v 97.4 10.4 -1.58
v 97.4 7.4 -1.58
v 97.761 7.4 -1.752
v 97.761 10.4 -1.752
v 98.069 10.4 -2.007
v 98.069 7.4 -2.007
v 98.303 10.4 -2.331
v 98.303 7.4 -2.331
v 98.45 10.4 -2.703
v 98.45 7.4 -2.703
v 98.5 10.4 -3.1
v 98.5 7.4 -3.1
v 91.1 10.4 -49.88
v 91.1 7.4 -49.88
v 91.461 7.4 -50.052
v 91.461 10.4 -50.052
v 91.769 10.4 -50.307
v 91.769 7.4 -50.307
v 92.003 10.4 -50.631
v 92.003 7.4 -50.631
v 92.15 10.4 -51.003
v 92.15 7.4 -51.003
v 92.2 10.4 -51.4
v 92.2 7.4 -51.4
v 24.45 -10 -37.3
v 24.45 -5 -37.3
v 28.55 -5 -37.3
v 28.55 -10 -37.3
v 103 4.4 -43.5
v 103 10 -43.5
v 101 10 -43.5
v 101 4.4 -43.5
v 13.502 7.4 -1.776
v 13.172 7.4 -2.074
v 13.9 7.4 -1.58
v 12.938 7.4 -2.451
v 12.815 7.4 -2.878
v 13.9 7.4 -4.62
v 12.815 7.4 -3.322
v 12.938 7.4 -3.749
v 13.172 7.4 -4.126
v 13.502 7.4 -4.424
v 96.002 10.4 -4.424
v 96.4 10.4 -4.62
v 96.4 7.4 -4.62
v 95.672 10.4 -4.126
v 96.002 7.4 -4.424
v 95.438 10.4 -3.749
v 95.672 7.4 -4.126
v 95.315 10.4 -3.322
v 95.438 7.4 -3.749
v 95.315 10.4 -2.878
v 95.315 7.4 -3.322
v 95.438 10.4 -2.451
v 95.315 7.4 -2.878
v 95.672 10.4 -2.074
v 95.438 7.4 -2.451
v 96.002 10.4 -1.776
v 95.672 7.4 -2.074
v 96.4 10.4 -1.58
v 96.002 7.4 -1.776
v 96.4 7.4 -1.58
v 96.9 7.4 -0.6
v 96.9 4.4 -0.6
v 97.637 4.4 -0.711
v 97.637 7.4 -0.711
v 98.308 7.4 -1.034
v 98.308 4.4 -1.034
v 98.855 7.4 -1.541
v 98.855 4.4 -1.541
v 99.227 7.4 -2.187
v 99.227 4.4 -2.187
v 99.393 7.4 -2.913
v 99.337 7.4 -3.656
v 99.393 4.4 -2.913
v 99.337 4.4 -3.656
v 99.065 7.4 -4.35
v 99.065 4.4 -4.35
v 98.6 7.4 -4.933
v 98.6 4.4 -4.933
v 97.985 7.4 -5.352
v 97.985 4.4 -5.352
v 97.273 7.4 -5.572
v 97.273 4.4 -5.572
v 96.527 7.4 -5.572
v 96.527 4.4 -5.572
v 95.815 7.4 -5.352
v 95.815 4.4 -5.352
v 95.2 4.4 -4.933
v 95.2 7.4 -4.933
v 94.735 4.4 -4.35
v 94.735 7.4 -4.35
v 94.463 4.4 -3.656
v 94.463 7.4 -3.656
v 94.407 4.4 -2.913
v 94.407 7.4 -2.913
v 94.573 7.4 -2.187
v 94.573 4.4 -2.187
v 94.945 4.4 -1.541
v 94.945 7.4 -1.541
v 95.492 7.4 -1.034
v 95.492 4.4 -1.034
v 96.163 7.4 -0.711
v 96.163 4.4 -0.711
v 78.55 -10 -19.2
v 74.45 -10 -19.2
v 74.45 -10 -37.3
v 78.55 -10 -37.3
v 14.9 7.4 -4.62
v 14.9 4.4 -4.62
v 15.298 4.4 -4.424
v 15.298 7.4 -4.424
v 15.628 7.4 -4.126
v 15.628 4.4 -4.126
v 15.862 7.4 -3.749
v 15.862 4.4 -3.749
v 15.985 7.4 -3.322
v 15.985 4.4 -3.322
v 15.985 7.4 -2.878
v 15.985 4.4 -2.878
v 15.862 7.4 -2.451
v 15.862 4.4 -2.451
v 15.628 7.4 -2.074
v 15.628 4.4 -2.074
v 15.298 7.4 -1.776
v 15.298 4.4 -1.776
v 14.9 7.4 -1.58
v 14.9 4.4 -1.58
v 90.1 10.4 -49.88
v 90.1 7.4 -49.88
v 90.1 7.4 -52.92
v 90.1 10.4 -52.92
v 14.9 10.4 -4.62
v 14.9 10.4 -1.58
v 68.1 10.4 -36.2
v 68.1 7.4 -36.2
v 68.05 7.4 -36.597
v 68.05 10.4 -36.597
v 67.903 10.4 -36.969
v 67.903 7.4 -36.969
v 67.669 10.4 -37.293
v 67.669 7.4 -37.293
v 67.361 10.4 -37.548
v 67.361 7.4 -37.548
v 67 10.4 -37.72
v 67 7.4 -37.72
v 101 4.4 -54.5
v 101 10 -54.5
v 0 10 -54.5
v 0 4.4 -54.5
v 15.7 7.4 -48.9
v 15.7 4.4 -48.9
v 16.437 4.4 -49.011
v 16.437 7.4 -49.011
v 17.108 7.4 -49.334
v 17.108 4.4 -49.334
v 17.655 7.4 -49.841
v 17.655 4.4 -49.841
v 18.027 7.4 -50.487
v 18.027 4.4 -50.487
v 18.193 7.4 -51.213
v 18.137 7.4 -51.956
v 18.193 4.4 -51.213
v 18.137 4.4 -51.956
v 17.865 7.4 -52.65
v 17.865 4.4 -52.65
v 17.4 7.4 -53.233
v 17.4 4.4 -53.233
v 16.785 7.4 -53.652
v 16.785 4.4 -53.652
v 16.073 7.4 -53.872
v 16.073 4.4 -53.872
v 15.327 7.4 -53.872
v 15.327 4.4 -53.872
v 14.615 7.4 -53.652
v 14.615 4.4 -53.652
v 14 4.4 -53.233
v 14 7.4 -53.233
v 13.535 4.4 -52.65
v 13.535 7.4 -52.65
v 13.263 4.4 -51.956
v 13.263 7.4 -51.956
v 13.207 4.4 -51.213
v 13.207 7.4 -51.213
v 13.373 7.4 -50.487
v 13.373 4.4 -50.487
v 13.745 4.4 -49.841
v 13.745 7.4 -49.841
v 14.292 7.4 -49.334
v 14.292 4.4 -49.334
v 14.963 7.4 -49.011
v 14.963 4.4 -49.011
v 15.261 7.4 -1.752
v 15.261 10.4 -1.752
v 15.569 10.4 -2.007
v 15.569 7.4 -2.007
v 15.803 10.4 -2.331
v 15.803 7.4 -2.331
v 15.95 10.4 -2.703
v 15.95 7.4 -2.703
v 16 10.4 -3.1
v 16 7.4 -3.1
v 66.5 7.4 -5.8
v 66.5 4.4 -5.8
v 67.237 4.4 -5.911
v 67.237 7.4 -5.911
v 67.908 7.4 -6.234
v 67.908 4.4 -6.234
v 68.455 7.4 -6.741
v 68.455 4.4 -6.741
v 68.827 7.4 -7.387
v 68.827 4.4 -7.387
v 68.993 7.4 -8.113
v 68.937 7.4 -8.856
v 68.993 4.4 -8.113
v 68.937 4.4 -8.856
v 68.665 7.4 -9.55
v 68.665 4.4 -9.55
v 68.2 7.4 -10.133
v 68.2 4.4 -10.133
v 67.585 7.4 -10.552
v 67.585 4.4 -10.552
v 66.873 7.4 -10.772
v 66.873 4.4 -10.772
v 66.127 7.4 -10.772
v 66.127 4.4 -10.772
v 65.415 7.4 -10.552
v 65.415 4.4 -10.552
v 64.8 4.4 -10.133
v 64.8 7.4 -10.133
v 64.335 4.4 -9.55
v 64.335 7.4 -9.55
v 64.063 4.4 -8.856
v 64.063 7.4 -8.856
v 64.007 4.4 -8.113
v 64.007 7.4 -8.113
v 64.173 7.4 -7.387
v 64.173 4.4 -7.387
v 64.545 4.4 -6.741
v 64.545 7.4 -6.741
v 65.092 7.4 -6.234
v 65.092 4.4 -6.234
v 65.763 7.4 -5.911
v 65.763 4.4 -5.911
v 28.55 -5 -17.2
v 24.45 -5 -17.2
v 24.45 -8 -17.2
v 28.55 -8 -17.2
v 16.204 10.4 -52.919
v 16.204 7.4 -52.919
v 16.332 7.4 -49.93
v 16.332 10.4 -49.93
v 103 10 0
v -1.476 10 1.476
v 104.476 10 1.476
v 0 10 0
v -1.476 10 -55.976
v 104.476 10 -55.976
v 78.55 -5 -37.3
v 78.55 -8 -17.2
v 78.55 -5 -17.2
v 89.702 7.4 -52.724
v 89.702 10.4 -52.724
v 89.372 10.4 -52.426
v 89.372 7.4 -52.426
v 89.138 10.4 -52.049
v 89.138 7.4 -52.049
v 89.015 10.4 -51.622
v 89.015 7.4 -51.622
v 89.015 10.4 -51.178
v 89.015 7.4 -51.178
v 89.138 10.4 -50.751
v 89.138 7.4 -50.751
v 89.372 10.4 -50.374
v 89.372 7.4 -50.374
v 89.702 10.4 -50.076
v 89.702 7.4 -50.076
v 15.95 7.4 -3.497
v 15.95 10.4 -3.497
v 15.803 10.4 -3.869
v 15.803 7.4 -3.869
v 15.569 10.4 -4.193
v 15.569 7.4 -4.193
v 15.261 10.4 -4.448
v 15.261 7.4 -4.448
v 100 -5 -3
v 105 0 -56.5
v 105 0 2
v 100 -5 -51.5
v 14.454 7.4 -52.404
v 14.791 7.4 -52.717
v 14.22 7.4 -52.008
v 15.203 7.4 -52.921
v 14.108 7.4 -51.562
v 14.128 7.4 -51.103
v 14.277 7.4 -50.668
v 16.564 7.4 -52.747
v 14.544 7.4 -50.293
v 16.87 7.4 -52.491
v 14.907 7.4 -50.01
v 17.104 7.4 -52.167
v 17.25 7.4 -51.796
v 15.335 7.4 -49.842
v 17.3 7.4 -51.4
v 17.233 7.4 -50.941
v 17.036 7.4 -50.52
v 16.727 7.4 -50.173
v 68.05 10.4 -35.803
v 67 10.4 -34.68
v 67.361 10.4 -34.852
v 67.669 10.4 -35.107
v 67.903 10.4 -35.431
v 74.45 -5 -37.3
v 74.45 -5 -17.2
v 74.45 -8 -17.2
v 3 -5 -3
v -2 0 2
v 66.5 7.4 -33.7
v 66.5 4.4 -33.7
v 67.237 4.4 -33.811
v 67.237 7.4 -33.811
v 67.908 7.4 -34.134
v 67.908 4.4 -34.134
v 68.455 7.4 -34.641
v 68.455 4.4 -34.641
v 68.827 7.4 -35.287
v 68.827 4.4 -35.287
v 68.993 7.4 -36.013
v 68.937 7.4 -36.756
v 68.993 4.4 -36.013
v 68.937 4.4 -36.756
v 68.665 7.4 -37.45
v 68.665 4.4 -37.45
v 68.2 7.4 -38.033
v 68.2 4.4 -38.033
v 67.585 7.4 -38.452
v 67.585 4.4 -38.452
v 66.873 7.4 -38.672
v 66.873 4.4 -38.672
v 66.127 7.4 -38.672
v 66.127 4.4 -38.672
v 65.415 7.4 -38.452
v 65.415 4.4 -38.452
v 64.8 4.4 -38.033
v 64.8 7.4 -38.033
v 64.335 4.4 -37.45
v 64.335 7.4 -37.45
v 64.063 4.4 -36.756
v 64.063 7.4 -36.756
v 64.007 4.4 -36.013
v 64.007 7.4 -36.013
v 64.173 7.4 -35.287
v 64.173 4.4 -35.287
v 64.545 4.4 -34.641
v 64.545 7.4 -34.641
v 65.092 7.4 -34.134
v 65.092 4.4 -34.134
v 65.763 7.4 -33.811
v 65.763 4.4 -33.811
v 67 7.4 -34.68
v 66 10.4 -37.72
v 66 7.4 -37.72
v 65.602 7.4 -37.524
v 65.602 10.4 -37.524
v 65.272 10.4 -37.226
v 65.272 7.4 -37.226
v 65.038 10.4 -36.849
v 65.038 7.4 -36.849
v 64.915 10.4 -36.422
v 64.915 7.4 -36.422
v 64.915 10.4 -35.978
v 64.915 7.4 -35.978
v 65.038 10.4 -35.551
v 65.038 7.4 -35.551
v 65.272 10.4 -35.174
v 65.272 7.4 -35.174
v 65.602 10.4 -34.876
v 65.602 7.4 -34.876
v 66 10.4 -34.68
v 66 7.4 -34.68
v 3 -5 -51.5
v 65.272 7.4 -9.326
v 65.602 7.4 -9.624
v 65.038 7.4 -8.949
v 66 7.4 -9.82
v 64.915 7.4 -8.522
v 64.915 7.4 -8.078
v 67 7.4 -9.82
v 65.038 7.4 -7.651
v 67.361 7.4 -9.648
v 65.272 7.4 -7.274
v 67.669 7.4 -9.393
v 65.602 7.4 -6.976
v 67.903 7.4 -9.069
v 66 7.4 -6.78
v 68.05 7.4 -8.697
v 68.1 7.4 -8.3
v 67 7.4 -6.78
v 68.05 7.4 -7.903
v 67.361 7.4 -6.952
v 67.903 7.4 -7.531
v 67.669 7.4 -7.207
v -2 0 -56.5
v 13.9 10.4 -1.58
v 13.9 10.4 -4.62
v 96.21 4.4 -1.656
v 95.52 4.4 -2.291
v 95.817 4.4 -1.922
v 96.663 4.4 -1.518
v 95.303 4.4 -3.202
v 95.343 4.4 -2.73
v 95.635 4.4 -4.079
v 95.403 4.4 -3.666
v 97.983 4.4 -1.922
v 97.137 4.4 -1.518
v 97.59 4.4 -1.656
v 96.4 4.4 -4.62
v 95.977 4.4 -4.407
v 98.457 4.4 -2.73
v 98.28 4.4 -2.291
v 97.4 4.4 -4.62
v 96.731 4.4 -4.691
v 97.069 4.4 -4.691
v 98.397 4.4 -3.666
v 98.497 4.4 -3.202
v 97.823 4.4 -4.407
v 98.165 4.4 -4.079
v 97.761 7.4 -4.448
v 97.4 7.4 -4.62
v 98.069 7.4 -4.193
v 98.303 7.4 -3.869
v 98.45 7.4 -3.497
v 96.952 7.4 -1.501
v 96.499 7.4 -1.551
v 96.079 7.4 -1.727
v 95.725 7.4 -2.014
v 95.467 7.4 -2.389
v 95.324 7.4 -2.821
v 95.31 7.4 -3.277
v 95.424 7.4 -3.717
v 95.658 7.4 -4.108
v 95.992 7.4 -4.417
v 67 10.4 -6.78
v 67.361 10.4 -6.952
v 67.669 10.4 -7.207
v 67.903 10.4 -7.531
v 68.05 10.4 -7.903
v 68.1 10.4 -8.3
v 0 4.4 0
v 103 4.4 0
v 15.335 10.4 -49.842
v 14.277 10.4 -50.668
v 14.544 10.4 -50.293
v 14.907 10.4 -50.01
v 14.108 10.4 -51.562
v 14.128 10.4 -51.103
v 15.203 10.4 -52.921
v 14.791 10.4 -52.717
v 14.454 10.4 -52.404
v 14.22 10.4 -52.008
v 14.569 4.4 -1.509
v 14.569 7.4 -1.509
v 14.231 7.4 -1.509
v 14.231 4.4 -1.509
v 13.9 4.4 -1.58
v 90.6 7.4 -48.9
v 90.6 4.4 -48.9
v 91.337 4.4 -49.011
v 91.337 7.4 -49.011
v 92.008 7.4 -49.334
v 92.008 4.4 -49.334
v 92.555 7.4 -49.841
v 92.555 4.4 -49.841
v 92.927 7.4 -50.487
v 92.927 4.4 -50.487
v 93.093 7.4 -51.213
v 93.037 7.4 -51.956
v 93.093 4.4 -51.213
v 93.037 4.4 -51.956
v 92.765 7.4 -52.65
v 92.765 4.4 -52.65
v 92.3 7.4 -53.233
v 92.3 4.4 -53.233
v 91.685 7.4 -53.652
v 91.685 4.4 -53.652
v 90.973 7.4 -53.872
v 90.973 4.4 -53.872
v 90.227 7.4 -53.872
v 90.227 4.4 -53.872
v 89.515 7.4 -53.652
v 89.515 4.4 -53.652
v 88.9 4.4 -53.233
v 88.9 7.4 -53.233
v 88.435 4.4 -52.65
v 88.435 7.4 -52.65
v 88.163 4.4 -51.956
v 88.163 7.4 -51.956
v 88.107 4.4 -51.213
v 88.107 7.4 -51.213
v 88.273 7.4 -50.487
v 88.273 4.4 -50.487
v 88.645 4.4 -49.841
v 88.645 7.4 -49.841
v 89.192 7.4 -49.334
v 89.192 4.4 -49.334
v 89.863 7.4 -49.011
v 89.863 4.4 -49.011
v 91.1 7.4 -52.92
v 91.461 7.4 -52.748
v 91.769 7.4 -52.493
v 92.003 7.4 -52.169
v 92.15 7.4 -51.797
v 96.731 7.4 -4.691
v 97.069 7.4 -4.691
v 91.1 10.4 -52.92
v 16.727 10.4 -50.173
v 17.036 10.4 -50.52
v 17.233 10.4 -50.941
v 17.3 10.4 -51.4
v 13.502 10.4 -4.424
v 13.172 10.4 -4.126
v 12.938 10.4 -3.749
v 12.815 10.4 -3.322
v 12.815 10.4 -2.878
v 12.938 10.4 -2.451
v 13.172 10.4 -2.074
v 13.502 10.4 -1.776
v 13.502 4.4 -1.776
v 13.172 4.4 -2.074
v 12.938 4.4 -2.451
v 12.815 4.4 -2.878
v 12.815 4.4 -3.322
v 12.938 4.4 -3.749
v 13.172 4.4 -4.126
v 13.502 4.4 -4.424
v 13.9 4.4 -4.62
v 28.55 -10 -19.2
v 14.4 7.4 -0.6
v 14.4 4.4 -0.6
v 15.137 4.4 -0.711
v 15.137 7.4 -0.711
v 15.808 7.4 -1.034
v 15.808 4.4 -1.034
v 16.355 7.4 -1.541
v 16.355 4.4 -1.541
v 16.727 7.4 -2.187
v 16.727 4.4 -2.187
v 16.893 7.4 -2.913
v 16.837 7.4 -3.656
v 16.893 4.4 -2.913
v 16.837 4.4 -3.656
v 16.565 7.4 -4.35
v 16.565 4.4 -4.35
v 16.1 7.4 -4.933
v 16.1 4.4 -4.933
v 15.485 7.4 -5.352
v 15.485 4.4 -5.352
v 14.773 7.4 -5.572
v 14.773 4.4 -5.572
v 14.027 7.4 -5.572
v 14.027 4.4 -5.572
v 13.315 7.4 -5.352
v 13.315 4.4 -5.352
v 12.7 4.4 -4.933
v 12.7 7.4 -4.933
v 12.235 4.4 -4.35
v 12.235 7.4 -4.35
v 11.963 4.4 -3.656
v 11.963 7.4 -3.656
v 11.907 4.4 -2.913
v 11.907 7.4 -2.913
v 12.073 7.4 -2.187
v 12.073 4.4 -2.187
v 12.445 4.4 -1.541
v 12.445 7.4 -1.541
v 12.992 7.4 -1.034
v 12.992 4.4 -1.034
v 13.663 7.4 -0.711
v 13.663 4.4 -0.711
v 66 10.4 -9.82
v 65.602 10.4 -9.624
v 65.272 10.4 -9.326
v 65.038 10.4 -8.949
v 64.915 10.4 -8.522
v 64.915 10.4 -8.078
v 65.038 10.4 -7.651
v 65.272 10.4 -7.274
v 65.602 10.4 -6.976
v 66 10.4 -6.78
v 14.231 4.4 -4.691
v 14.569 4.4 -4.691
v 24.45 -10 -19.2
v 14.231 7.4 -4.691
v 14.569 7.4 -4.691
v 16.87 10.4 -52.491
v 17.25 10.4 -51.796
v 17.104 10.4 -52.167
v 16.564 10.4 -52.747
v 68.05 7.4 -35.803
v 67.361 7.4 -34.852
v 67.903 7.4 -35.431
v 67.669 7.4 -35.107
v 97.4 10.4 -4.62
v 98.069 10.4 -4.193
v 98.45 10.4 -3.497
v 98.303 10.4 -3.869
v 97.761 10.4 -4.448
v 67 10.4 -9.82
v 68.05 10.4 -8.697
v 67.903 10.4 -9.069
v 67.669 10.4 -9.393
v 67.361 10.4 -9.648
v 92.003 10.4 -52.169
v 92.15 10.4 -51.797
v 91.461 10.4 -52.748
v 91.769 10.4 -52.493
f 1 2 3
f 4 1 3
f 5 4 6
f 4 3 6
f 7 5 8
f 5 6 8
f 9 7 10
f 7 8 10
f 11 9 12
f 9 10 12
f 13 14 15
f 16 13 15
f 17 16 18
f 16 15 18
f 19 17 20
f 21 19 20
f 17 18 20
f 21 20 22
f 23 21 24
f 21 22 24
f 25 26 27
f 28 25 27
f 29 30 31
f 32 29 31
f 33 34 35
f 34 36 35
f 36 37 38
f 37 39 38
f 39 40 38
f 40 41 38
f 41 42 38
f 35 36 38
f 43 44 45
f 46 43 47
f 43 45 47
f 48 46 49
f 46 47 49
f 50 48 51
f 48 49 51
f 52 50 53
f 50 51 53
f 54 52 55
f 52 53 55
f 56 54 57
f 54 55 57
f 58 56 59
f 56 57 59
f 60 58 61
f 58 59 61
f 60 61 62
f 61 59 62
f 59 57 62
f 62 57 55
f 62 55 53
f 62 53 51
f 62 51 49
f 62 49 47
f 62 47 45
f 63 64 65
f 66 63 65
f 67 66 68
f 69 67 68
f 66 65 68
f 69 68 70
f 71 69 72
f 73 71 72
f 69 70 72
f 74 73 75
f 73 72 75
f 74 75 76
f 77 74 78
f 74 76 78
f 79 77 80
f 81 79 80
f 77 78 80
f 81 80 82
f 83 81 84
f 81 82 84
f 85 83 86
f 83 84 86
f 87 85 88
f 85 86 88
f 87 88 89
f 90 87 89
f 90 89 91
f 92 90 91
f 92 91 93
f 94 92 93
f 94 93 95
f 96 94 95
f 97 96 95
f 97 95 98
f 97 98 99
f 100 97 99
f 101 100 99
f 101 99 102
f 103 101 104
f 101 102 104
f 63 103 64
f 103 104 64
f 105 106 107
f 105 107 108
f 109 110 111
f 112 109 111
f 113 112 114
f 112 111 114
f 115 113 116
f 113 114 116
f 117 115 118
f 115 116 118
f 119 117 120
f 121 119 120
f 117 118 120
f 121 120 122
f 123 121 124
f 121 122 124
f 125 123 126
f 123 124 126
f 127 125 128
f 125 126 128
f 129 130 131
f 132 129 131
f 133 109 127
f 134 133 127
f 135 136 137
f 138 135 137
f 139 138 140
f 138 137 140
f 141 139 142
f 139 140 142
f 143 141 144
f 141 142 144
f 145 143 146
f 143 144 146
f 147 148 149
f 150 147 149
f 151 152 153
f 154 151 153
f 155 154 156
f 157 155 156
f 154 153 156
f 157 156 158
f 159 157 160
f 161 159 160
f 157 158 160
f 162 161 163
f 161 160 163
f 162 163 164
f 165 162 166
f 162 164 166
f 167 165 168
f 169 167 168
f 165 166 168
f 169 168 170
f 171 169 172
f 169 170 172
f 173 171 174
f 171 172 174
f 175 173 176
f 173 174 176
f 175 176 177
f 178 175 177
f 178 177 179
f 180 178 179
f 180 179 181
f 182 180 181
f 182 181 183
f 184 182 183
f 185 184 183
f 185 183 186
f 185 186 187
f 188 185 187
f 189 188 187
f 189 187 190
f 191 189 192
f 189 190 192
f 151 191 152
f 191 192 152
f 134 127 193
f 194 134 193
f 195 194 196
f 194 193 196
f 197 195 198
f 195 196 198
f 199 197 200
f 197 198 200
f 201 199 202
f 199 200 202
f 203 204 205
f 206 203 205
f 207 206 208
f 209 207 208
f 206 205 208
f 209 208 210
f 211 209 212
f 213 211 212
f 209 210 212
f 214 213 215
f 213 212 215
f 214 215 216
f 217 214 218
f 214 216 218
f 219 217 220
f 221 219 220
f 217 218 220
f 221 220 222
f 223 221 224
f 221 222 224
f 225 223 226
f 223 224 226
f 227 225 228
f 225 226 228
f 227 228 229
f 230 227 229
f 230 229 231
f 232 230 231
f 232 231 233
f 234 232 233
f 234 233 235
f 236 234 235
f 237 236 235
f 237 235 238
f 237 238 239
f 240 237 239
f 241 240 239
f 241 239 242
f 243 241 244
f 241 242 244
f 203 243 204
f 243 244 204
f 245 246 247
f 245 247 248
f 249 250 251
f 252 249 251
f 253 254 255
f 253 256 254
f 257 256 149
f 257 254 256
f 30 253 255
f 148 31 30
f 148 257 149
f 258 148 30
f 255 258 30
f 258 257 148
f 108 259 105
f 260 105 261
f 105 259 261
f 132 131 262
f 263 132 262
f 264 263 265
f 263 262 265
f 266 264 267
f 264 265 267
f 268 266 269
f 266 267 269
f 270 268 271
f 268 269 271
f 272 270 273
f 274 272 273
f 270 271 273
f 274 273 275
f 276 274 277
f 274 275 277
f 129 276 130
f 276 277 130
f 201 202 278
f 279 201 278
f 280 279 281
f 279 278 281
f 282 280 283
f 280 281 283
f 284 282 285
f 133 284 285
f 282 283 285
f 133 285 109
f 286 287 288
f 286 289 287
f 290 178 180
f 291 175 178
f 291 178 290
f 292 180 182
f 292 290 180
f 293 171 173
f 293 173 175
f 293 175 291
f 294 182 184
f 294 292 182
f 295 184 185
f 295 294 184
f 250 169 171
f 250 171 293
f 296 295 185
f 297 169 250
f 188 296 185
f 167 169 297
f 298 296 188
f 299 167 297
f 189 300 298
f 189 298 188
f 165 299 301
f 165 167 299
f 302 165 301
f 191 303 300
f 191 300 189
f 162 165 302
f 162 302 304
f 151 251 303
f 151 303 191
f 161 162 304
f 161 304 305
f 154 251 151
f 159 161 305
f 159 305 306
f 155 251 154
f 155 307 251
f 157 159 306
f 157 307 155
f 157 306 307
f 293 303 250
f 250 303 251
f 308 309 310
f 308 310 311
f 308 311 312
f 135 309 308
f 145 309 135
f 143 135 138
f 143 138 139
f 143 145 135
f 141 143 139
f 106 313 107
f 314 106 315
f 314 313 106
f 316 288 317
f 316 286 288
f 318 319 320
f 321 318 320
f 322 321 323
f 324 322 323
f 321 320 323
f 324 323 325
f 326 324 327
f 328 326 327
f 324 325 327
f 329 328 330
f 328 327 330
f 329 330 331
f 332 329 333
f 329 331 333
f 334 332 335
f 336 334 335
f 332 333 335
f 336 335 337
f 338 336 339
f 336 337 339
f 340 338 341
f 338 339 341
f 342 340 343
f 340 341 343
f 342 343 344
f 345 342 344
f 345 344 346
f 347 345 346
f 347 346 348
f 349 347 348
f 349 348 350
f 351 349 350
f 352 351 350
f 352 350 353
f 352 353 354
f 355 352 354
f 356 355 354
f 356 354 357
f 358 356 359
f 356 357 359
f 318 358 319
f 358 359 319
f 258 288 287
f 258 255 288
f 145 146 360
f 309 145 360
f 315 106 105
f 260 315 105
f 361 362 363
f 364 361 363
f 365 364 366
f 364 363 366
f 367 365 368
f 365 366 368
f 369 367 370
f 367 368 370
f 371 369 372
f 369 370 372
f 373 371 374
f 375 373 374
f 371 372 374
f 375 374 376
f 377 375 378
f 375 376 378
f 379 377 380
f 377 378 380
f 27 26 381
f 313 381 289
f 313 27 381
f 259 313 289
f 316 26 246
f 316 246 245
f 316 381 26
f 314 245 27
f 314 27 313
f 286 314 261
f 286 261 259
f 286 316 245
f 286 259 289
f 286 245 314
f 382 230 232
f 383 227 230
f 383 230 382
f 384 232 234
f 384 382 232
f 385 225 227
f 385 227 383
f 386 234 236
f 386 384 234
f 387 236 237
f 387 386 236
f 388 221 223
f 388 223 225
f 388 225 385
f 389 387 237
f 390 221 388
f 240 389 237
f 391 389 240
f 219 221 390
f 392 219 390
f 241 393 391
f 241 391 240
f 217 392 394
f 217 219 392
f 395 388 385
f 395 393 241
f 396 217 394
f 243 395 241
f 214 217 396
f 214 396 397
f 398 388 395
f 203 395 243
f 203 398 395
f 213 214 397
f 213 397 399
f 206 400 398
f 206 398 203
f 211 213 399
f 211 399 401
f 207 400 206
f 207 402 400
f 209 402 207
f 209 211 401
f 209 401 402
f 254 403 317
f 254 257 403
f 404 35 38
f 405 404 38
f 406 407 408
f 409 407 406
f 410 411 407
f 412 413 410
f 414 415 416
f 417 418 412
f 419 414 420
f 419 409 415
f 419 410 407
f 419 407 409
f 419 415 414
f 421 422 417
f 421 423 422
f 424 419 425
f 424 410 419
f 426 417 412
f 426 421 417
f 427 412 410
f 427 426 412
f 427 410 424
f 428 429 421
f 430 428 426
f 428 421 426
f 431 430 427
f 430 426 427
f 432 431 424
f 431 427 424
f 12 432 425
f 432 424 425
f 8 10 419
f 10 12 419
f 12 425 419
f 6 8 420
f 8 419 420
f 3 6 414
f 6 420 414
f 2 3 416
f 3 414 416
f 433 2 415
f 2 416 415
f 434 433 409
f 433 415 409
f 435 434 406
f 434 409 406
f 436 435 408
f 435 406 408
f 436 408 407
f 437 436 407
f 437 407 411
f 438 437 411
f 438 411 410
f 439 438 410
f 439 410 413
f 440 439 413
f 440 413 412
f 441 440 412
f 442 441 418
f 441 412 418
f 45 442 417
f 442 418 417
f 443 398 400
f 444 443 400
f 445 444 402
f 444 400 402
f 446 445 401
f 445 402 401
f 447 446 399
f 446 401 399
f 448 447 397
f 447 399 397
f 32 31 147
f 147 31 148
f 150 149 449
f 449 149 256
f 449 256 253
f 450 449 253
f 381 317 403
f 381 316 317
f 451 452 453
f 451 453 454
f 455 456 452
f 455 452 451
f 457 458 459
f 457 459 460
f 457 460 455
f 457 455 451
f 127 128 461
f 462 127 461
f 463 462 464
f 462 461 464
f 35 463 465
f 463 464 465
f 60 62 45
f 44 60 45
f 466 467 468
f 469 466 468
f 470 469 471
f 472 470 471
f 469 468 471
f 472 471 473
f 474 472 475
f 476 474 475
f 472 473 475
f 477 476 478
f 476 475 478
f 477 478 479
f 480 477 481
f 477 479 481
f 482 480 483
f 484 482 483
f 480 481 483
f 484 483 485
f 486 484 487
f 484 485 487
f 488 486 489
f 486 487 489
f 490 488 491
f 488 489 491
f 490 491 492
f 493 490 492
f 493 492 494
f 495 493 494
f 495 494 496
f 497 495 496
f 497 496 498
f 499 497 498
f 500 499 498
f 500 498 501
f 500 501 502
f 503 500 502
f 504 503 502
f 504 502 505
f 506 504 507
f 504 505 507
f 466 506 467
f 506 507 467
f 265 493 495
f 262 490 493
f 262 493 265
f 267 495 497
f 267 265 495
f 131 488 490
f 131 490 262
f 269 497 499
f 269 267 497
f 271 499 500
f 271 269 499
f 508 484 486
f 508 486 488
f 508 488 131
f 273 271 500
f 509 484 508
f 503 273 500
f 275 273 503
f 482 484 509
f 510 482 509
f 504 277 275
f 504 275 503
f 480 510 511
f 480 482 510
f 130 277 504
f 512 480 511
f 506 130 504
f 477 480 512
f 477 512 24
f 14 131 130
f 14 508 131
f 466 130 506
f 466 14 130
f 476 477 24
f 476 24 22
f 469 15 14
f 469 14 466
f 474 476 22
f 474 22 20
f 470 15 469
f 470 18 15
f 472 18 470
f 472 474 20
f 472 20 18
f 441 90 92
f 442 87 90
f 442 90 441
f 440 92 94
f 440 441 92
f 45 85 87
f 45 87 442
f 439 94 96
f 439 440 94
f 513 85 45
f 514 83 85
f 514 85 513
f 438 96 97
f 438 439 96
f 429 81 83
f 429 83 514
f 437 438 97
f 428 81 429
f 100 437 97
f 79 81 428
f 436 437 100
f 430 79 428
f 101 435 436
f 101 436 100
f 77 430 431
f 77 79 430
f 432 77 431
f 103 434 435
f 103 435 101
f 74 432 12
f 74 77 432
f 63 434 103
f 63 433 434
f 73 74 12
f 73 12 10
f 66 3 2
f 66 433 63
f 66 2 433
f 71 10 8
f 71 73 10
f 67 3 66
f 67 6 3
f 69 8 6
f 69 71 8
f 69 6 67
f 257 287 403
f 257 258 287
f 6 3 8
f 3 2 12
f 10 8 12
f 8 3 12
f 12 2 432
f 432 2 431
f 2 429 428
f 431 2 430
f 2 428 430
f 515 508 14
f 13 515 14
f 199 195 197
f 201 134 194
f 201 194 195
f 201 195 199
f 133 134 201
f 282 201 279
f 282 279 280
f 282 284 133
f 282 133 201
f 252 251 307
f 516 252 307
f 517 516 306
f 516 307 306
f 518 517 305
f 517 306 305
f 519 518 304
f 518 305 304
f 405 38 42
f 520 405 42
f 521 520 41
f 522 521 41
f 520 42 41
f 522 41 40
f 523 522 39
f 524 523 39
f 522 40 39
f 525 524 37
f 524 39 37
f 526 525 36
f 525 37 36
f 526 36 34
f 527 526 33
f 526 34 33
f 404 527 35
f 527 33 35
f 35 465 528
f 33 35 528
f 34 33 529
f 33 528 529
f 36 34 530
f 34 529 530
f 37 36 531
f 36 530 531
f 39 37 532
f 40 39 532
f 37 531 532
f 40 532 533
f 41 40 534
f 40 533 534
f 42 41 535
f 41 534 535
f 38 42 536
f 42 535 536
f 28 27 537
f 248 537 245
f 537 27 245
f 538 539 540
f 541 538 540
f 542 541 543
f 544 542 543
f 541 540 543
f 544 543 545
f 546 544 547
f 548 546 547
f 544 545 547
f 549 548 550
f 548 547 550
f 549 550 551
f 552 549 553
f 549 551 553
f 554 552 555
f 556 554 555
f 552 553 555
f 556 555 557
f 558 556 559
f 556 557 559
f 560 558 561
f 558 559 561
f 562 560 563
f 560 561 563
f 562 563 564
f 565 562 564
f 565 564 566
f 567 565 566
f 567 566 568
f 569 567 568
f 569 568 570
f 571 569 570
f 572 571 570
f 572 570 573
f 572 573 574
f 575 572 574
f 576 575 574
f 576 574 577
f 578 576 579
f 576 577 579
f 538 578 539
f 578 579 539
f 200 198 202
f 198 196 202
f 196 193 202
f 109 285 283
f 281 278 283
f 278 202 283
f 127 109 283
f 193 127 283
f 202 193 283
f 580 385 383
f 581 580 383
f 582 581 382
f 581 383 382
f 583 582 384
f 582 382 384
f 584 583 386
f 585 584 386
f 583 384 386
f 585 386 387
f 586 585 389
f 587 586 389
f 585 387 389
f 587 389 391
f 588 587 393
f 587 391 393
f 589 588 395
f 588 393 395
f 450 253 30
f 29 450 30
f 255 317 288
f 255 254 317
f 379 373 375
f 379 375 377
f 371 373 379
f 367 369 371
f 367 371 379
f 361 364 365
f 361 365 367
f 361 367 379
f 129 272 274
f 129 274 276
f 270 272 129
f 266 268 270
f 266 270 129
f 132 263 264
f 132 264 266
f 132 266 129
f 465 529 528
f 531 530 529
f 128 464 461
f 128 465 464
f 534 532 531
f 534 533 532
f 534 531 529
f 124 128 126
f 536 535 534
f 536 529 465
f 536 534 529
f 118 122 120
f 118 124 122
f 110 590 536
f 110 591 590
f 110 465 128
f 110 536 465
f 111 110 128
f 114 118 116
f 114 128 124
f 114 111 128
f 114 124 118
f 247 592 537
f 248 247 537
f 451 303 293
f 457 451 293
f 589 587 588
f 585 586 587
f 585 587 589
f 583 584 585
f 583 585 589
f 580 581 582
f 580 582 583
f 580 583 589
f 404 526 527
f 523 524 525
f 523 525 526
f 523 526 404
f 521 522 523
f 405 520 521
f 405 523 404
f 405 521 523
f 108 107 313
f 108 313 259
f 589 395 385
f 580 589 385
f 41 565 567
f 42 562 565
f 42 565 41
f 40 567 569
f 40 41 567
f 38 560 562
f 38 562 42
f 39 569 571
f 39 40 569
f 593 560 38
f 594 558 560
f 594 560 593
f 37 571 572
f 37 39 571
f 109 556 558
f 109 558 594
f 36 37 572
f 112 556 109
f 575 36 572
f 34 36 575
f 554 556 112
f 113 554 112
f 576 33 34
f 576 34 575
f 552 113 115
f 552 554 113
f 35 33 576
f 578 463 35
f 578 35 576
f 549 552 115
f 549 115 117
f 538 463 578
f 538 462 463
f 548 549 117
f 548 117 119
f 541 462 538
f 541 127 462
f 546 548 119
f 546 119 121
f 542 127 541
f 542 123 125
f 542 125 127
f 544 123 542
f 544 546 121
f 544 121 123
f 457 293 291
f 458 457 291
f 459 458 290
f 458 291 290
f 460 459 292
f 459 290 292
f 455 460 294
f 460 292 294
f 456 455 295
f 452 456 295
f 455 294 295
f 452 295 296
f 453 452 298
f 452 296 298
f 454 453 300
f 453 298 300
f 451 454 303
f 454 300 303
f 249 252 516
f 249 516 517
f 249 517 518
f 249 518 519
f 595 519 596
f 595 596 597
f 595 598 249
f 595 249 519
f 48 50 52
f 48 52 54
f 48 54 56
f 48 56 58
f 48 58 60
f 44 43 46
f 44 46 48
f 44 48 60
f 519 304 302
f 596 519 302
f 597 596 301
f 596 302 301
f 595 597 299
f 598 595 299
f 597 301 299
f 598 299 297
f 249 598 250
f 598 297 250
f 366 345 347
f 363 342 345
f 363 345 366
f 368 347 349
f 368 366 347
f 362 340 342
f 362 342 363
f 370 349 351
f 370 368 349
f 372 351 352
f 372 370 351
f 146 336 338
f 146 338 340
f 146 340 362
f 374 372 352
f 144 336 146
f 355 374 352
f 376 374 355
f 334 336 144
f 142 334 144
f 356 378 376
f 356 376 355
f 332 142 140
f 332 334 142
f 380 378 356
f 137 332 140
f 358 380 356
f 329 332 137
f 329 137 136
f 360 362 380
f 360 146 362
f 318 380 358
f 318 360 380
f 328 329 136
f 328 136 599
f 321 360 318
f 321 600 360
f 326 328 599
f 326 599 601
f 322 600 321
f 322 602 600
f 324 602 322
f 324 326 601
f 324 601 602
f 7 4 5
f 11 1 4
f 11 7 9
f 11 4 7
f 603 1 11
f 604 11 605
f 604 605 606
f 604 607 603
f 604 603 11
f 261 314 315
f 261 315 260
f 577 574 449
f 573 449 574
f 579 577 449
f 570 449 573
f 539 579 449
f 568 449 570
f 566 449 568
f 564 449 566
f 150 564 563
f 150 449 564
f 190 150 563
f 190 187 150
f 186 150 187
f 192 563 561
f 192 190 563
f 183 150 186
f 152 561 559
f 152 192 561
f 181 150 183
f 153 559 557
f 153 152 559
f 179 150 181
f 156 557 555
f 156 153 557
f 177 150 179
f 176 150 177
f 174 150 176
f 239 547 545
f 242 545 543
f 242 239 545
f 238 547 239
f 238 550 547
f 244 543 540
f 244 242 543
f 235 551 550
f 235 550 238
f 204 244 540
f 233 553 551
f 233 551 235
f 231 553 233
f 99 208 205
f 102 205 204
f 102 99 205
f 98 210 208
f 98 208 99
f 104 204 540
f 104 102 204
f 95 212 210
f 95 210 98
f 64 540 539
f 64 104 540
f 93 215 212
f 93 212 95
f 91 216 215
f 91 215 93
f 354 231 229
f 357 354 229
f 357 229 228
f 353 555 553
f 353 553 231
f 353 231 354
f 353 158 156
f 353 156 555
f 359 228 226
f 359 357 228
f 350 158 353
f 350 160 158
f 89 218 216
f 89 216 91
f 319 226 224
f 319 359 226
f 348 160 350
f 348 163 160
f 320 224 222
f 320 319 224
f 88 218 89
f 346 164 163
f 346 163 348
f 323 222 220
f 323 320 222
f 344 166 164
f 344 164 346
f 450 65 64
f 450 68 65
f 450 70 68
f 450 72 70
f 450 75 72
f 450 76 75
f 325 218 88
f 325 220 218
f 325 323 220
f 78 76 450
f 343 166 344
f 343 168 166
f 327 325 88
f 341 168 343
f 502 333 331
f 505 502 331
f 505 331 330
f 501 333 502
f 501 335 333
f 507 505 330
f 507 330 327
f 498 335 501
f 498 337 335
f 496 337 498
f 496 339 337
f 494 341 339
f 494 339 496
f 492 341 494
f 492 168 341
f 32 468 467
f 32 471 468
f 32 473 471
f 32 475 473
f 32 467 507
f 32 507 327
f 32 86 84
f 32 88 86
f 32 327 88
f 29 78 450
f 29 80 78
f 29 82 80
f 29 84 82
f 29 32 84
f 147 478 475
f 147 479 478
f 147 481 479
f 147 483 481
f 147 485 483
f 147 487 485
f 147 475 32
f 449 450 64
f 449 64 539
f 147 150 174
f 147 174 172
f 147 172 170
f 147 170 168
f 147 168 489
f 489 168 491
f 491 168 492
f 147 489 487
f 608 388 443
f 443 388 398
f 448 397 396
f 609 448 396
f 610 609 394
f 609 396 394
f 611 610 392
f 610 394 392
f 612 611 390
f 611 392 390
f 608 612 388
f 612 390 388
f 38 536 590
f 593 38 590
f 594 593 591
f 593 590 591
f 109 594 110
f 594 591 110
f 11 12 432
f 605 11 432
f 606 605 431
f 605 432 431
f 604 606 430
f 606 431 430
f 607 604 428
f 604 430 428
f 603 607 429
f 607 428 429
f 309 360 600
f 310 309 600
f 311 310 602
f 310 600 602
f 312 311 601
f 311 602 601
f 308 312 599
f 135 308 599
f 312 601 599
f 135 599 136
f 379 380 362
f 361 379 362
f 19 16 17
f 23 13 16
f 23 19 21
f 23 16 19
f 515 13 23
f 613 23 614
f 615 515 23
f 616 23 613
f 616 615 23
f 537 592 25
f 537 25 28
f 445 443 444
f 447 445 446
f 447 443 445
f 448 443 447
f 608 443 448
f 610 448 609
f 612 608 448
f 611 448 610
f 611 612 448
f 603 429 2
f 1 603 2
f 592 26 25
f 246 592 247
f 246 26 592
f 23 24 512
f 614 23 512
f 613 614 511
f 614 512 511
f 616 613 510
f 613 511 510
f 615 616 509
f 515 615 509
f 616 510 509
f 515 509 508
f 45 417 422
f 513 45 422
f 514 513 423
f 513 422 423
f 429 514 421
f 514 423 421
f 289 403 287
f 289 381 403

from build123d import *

# Parameters (mm, degrees)
SKETCH2_W           = 107
SKETCH2_H           = 58.5
BOSS_EXTRUDE1_DEPTH = 10
BOSS_EXTRUDE1_TAPER = 3
CUT_EXTRUDE1_START  = 10
SKETCH2_5_W         = 2
SKETCH2_5_H         = 1
CUT_EXTRUDE1_DEPTH  = 5.6
SKETCH8_W           = 107
SKETCH8_H           = 58.5
BOSS_EXTRUDE2_DEPTH = 5
BOSS_EXTRUDE2_TAPER = 45
SKETCH9_W           = 4.1
SKETCH9_H           = 20.1
BOSS_EXTRUDE3_DEPTH = 5
CHAMFER1_SIZE       = 2
SKETCH10_R          = 2.5
BOSS_EXTRUDE4_DEPTH = 3
BOSS_EXTRUDE5_START = 3
BOSS_EXTRUDE5_DEPTH = 3


with BuildPart() as part:
    # Sketch2 → Boss-Extrude1 (new body)
    with BuildSketch(Plane(origin=(0, 0, 0), x_dir=(1, 0, 0), z_dir=(0, 1, 0))):
        with Locations((51.5, 27.25)):
            Rectangle(SKETCH2_W, SKETCH2_H)
    extrude(amount=BOSS_EXTRUDE1_DEPTH, taper=BOSS_EXTRUDE1_TAPER)

    # Sketch2<5> → Cut-Extrude1 (cut)
    with BuildSketch(Plane(origin=(0, 0, 0), x_dir=(1, 0, 0), z_dir=(0, 1, 0)).offset(CUT_EXTRUDE1_START)):
        Polygon((0, 0), (101, 0), (101, 1), (103, 3), (103, 41.5), (101, 43.5), (101, 54.5), (0, 54.5), align=None)
        Polygon((103, 43.5), (101, 43.5), (103, 41.5), align=None)
        Polygon((103, 3), (101, 1), (103, 1), align=None)
        with Locations((102, 0.5)):
            Rectangle(SKETCH2_5_W, SKETCH2_5_H)
    extrude(amount=-CUT_EXTRUDE1_DEPTH, mode=Mode.SUBTRACT)

    # Sketch8 → Boss-Extrude2 (add)
    with BuildSketch(Plane.XZ):
        with Locations((51.5, -27.25)):
            Rectangle(SKETCH8_W, SKETCH8_H)
    extrude(amount=BOSS_EXTRUDE2_DEPTH, taper=BOSS_EXTRUDE2_TAPER)

    # Sketch9 → Boss-Extrude3 (add)
    with BuildSketch(Plane.XZ.offset(5)):
        with Locations((26.5, -27.25)):
            Rectangle(SKETCH9_W, SKETCH9_H)
        with Locations((76.5, -27.25)):
            Rectangle(SKETCH9_W, SKETCH9_H)
    extrude(amount=BOSS_EXTRUDE3_DEPTH)

    # Chamfer1
    chamfer1_edges = [part.edges().sort_by_distance(p)[0] for p in [
        (26.5, -10, -17.2),
        (76.5, -10, -17.2),
    ]]
    chamfer(chamfer1_edges, length=CHAMFER1_SIZE)

    # Sketch10 → Boss-Extrude4 (add)
    # profile 1 of 6: a face of its own
    with BuildSketch(Plane(origin=(0, 4.4, 0), x_dir=(1, 0, 0), z_dir=(0, 1, 0))):
        with Locations(Location((15.7, 51.4, 0), (0, 0, 270))):
            Circle(SKETCH10_R)
    # profile 2 of 6: a face of its own
    with BuildSketch(Plane(origin=(0, 4.4, 0), x_dir=(1, 0, 0), z_dir=(0, 1, 0))):
        with Locations(Location((90.6, 51.4, 0), (0, 0, 270))):
            Circle(SKETCH10_R)
    # profile 3 of 6: a face of its own
    with BuildSketch(Plane(origin=(0, 4.4, 0), x_dir=(1, 0, 0), z_dir=(0, 1, 0))):
        with Locations(Location((66.5, 8.3, 0), (0, 0, 270))):
            Circle(SKETCH10_R)
    # profile 4 of 6: a face of its own
    with BuildSketch(Plane(origin=(0, 4.4, 0), x_dir=(1, 0, 0), z_dir=(0, 1, 0))):
        with Locations(Location((66.5, 36.2, 0), (0, 0, 270))):
            Circle(SKETCH10_R)
    # profile 5 of 6: a face of its own
    with BuildSketch(Plane(origin=(0, 4.4, 0), x_dir=(1, 0, 0), z_dir=(0, 1, 0))):
        with Locations(Location((96.9, 3.1, 0), (0, 0, 270))):
            Circle(SKETCH10_R)
        with BuildLine():
            ThreePointArc((96.4, 4.619868415), (96.9, 4.7), (97.4, 4.619868415))
            ThreePointArc((97.4, 4.619868415), (96.9, 1.5), (96.4, 4.619868415))
        make_face(mode=Mode.SUBTRACT)
    # profile 6 of 6: a face of its own
    with BuildSketch(Plane(origin=(0, 4.4, 0), x_dir=(1, 0, 0), z_dir=(0, 1, 0))):
        with Locations(Location((14.4, 3.1, 0), (0, 0, 270))):
            Circle(SKETCH10_R)
        with BuildLine():
            ThreePointArc((13.9, 1.580131585), (12.8, 3.1), (13.9, 4.619868415))
            ThreePointArc((13.9, 4.619868415), (14.4, 4.7), (14.9, 4.619868415))
            ThreePointArc((14.9, 4.619868415), (16, 3.1), (14.9, 1.580131585))
            ThreePointArc((14.9, 1.580131585), (14.4, 1.5), (13.9, 1.580131585))
        make_face(mode=Mode.SUBTRACT)
    extrude(amount=BOSS_EXTRUDE4_DEPTH)

    # Sketch10<3> → Boss-Extrude5 (add)
    with BuildSketch(Plane(origin=(0, 4.4, 0), x_dir=(1, 0, 0), z_dir=(0, 1, 0)).offset(BOSS_EXTRUDE5_START)):
        with BuildLine():
            ThreePointArc((17.3, 51.4), (16.997366288, 52.336397733), (16.203949106, 52.918563564))
            Line((16.203949106, 52.918563564), (16.332025214, 49.930121049))
            ThreePointArc((16.332025214, 49.930121049), (17.036270995, 50.520011461), (17.3, 51.4))
        make_face()
        with BuildLine():
            Line((15.334874522, 49.842218441), (15.202934006, 52.920830496))
            ThreePointArc((15.202934006, 52.920830496), (14.101467367, 51.331491459), (15.334874522, 49.842218441))
        make_face()
        with BuildLine():
            ThreePointArc((92.2, 51.4), (91.89614814, 52.338083152), (91.1, 52.919868415))
            Line((91.1, 52.919868415), (91.1, 49.880131585))
            ThreePointArc((91.1, 49.880131585), (91.89614814, 50.461916848), (92.2, 51.4))
        make_face()
        with BuildLine():
            Line((90.1, 49.880131585), (90.1, 52.919868415))
            ThreePointArc((90.1, 52.919868415), (89, 51.4), (90.1, 49.880131585))
        make_face()
        with BuildLine():
            ThreePointArc((16, 3.1), (15.69614814, 4.038083152), (14.9, 4.619868415))
            Line((14.9, 4.619868415), (14.9, 1.580131585))
            ThreePointArc((14.9, 1.580131585), (15.69614814, 2.161916848), (16, 3.1))
        make_face()
        with BuildLine():
            Line((13.9, 1.580131585), (13.9, 4.619868415))
            ThreePointArc((13.9, 4.619868415), (12.8, 3.1), (13.9, 1.580131585))
        make_face()
        with BuildLine():
            ThreePointArc((68.1, 36.2), (67.79614814, 37.138083152), (67, 37.719868415))
            Line((67, 37.719868415), (67, 34.680131585))
            ThreePointArc((67, 34.680131585), (67.79614814, 35.261916848), (68.1, 36.2))
        make_face()
        with BuildLine():
            Line((66, 34.680131585), (66, 37.719868415))
            ThreePointArc((66, 37.719868415), (64.9, 36.2), (66, 34.680131585))
        make_face()
        with BuildLine():
            ThreePointArc((68.1, 8.3), (67.79614814, 9.238083152), (67, 9.819868415))
            Line((67, 9.819868415), (67, 6.780131585))
            ThreePointArc((67, 6.780131585), (67.79614814, 7.361916848), (68.1, 8.3))
        make_face()
        with BuildLine():
            Line((66, 6.780131585), (66, 9.819868415))
            ThreePointArc((66, 9.819868415), (64.9, 8.3), (66, 6.780131585))
        make_face()
        with BuildLine():
            ThreePointArc((98.5, 3.1), (98.19614814, 4.038083152), (97.4, 4.619868415))
            Line((97.4, 4.619868415), (97.4, 1.580131585))
            ThreePointArc((97.4, 1.580131585), (98.19614814, 2.161916848), (98.5, 3.1))
        make_face()
        with BuildLine():
            Line((96.4, 1.580131585), (96.4, 4.619868415))
            ThreePointArc((96.4, 4.619868415), (95.3, 3.1), (96.4, 1.580131585))
        make_face()
    extrude(amount=BOSS_EXTRUDE5_DEPTH)


with BuildPart() as boss_extrude5_piece_1:
    # of the separate pieces the step leaves, piece 1, a body of its own (boss_extrude5_pieces)
    add(part.part.solids().sort_by_distance((78.55, -8, -17.2))[0])


with BuildPart() as boss_extrude5_piece_2:
    # of the separate pieces the step leaves, piece 2, a body of its own (boss_extrude5_pieces)
    add(part.part.solids().sort_by_distance((96.4, 10.4, -4.619868415))[0])


with BuildPart() as boss_extrude5_piece_3:
    # of the separate pieces the step leaves, piece 3, a body of its own (boss_extrude5_pieces)
    add(part.part.solids().sort_by_distance((13.9, 10.4, -4.619868415))[0])


with BuildPart() as boss_extrude5_piece_4:
    # of the separate pieces the step leaves, piece 4, a body of its own (boss_extrude5_pieces)
    add(part.part.solids().sort_by_distance((97.4, 10.4, -1.580131585))[0])


with BuildPart() as boss_extrude5_piece_5:
    # of the separate pieces the step leaves, piece 5, a body of its own (boss_extrude5_pieces)
    add(part.part.solids().sort_by_distance((14.9, 10.4, -1.580131585))[0])


solid = Compound([boss_extrude5_piece_1.part, boss_extrude5_piece_2.part, boss_extrude5_piece_3.part, boss_extrude5_piece_4.part, boss_extrude5_piece_5.part])
